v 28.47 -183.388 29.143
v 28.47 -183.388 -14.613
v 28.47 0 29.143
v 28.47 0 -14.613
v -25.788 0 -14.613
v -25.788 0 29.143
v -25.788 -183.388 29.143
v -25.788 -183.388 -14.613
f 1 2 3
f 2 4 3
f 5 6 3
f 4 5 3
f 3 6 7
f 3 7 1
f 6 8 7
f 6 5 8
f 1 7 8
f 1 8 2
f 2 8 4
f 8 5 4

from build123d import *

# Parameters (mm, degrees)
F0_W      = 54.258138
F0_H      = 43.755226
F1_DEPTH  = 60.96
F1_FACE_W = 54.258138
F1_FACE_H = 43.755226
F2_DEPTH  = 40.386
F3_DEPTH  = 122.428


with BuildPart() as f1:
    # F0 (on Front) → F1 (new body)
    with BuildSketch(Plane.XZ):
        with Locations((1.340933, 7.264946)):
            Rectangle(F0_W, F0_H)
    extrude(amount=F1_DEPTH)

    # F1_face (on face) → F2 (join)
    with BuildSketch(Plane(origin=(1.340933, -60.96, 7.264946), x_dir=(1, 0, 0), z_dir=(0, -1, 0))):
        Rectangle(F1_FACE_W, F1_FACE_H)
    extrude(amount=-F2_DEPTH)

    # F1_face (on face) → F3 (join)
    with BuildSketch(Plane(origin=(1.340933, -60.96, 7.264946), x_dir=(1, 0, 0), z_dir=(0, -1, 0))):
        Rectangle(F1_FACE_W, F1_FACE_H)
    extrude(amount=F3_DEPTH)


solid = f1.part
